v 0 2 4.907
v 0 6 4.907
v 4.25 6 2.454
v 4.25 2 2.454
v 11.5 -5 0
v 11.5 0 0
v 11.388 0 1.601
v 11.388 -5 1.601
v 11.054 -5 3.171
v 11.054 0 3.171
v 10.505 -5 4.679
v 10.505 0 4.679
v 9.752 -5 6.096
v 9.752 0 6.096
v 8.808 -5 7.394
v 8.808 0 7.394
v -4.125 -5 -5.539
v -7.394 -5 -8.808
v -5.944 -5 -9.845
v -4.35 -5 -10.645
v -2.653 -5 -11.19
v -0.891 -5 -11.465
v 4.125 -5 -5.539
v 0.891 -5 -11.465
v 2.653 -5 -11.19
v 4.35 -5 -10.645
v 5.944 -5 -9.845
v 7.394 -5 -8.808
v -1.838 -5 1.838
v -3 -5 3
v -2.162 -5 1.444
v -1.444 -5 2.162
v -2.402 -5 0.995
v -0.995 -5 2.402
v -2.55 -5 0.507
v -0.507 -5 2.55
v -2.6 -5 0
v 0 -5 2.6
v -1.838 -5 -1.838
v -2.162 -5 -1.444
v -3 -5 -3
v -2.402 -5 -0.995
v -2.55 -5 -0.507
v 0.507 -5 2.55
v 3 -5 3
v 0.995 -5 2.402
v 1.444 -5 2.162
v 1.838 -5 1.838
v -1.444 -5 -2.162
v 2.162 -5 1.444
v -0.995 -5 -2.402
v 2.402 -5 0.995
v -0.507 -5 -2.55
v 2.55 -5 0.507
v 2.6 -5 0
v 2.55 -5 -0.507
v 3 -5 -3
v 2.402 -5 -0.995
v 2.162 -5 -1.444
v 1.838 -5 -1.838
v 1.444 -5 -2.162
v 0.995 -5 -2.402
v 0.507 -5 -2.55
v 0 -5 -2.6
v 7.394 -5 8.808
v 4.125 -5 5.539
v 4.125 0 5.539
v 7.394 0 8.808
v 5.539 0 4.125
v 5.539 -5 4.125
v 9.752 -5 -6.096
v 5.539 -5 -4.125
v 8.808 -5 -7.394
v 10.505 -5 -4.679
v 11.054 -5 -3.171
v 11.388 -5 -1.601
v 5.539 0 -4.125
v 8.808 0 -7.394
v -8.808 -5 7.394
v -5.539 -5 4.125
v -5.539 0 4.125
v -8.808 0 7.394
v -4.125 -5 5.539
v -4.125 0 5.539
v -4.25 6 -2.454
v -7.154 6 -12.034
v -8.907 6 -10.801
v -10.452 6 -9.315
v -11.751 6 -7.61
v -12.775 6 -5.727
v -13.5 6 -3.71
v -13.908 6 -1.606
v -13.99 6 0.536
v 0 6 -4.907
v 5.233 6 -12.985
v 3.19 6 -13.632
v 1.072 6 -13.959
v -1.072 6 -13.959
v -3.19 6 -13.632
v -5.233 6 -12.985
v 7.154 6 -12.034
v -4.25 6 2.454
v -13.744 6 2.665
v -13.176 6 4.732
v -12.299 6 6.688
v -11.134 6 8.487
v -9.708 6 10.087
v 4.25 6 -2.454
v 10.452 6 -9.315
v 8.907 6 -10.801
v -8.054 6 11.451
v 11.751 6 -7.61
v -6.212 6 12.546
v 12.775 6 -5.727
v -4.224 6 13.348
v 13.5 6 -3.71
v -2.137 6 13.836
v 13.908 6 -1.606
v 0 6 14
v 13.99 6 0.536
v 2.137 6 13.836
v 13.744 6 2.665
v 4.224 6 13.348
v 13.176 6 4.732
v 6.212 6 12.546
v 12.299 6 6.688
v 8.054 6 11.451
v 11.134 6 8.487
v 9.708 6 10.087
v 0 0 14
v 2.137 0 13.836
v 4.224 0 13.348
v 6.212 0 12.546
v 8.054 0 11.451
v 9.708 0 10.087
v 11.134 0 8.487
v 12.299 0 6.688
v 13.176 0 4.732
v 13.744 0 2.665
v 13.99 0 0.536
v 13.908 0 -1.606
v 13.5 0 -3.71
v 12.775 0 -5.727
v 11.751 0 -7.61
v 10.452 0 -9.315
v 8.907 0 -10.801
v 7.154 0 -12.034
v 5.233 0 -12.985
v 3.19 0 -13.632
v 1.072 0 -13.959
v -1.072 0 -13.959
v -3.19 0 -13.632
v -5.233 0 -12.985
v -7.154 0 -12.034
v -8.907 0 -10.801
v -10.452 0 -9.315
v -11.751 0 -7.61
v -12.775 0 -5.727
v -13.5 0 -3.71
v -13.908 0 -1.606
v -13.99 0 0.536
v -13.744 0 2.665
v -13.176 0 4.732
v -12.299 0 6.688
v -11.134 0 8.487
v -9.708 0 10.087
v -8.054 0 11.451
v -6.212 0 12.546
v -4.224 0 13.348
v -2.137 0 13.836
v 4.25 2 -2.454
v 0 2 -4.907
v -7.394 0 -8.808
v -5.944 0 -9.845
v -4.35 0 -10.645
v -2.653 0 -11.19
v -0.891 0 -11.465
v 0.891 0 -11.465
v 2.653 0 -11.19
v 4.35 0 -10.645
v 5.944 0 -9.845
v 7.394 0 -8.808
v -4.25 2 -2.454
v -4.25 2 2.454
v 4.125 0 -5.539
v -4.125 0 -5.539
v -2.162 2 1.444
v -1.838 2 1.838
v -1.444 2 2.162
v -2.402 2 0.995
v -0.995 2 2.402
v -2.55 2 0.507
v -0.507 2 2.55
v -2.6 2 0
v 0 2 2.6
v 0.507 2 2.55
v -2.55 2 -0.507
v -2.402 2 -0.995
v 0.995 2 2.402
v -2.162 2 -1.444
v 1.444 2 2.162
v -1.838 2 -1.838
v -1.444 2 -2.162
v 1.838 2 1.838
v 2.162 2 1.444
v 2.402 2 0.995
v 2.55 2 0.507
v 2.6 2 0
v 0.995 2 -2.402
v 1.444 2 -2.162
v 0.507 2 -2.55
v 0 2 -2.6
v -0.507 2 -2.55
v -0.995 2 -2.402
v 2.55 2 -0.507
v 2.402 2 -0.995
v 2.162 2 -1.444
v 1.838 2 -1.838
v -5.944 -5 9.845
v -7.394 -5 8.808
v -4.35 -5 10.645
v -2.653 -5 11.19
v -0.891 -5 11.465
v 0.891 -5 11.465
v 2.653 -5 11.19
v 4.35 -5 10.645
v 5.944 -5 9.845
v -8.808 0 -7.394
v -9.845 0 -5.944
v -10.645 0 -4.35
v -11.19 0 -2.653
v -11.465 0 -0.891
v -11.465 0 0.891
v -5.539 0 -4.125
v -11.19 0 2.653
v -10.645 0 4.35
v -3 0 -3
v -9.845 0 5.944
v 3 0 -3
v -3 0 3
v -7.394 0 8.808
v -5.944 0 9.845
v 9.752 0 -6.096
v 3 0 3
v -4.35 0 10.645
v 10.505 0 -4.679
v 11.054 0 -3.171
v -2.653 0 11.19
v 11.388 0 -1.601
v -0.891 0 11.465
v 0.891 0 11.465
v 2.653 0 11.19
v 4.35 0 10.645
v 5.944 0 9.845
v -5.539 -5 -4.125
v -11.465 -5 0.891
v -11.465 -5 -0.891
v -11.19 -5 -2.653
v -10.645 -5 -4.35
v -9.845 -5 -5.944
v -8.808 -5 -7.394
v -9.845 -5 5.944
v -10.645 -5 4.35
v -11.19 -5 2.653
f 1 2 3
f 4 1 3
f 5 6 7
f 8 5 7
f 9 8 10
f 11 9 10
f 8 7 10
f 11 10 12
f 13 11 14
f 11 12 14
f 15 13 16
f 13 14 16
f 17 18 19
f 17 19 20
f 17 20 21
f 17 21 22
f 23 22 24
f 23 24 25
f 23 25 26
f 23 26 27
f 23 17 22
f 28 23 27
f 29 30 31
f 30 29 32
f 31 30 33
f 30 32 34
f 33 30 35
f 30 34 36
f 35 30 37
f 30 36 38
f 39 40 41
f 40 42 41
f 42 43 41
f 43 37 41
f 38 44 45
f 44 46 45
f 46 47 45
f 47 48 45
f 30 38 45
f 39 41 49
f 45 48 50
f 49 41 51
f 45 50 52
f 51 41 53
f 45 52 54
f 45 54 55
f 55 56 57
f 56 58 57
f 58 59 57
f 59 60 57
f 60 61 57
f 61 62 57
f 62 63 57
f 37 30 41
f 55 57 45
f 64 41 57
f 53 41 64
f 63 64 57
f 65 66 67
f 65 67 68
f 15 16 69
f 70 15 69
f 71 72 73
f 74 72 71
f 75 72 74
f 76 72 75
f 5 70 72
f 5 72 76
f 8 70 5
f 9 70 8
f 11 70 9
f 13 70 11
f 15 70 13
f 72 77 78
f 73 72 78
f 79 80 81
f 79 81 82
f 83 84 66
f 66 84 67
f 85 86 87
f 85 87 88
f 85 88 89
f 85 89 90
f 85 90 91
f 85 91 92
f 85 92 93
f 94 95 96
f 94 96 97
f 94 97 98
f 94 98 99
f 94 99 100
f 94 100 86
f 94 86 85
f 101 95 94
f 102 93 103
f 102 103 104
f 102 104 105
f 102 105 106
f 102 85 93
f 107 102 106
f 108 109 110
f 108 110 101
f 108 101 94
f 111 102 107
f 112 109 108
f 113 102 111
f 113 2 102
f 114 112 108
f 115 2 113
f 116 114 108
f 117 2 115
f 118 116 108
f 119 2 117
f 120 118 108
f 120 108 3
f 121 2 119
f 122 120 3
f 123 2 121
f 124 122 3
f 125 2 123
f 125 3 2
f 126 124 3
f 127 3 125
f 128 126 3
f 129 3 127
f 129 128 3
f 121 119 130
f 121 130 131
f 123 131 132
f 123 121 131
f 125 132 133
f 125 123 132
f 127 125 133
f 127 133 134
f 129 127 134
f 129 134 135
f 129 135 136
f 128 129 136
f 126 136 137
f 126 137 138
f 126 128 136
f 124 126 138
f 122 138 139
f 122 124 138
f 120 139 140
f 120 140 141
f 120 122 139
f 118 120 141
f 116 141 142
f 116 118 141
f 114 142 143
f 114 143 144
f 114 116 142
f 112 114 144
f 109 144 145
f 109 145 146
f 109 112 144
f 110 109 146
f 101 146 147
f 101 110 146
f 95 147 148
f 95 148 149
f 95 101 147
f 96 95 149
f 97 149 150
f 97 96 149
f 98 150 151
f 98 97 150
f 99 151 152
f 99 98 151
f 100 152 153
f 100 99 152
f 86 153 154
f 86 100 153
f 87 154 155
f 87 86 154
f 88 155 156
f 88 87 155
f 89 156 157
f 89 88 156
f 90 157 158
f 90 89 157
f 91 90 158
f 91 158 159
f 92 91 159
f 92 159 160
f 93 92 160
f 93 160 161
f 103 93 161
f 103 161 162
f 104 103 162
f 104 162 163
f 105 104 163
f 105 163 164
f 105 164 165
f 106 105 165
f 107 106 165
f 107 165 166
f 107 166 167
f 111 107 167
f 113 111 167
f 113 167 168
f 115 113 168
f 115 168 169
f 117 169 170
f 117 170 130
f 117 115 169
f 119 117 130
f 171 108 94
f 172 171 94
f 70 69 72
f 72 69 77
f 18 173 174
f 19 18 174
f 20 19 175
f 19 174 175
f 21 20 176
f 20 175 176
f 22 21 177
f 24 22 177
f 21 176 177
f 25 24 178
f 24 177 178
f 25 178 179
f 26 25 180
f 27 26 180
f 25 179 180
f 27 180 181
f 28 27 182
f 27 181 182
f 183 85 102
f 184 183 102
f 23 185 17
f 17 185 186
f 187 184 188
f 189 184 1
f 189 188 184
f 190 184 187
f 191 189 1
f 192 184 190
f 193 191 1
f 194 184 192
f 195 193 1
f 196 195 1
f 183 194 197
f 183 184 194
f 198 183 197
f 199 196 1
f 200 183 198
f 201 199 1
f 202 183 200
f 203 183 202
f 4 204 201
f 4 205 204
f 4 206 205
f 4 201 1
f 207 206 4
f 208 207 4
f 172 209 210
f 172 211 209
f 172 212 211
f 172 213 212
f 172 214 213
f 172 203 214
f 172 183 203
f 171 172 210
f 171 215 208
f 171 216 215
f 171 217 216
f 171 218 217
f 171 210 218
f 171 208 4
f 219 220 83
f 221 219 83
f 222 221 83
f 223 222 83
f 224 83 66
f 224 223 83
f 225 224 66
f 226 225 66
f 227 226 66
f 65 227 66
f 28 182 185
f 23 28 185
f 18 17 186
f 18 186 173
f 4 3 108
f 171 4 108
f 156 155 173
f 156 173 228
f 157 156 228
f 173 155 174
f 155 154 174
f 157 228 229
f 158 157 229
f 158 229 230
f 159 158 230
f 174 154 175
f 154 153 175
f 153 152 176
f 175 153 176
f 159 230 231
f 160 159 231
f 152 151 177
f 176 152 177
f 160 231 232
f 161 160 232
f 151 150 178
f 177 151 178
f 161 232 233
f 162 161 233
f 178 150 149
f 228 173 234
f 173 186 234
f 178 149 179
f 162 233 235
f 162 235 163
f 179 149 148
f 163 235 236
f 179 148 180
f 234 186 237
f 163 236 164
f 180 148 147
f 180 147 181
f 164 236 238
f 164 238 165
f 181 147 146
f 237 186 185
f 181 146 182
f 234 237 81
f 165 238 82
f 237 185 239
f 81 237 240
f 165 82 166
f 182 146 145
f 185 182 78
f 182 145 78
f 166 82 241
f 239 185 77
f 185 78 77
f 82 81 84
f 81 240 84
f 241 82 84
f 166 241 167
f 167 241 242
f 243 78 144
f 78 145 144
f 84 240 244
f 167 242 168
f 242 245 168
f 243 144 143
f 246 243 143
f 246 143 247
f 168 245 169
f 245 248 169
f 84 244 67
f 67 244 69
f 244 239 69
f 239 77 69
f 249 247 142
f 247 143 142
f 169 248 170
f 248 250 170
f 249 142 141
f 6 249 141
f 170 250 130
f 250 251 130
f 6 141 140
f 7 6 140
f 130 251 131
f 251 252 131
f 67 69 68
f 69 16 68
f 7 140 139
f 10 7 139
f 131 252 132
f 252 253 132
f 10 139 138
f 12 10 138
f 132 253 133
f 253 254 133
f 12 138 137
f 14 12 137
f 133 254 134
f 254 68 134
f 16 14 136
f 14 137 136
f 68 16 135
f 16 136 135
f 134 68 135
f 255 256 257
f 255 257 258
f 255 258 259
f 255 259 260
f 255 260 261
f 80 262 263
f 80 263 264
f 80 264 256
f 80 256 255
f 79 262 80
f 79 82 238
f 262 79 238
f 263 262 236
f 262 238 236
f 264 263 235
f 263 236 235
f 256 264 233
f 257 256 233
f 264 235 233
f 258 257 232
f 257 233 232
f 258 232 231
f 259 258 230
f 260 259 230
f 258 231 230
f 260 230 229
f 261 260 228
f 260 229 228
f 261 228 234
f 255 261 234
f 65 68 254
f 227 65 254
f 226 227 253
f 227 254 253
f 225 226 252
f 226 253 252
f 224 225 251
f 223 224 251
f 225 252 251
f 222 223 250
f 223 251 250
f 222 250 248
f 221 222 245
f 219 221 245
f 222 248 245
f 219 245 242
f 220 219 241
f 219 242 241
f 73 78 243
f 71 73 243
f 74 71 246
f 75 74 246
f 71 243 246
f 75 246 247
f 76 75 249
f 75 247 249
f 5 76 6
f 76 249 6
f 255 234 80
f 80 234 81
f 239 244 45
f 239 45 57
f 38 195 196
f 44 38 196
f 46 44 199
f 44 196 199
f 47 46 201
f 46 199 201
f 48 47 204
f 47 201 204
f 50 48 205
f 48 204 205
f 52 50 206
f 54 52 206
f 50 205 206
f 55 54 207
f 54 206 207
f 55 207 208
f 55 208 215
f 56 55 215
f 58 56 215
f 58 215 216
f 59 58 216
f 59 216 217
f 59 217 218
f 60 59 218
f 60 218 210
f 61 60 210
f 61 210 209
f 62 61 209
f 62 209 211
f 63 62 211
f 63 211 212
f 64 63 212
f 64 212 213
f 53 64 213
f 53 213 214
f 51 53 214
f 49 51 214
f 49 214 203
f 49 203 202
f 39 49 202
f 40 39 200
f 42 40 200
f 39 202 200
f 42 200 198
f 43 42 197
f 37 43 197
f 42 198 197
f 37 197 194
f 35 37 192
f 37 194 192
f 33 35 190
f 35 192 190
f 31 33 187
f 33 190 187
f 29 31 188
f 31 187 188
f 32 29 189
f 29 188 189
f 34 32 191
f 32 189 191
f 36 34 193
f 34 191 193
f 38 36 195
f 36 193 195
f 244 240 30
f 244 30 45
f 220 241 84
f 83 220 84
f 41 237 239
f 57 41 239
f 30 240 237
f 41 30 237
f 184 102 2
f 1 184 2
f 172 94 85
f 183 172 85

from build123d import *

# Parameters (mm, degrees)
SKETCH3_W           = 6
SKETCH3_H           = 6
SKETCH3_R           = 2.6
BASE_DEPTH          = 5
BLOC_START          = 6
SKETCH8_R           = 14
SKETCH8_R_2         = 2.6
BLOC_DEPTH          = 6
NUT_PLACE_DEPTH     = 4
REINFORCEMENT_DEPTH = 5


with BuildPart() as part:
    # Sketch3 → Base (new body)
    with BuildSketch(Plane(origin=(0, 0, 0), x_dir=(1, 0, 0), z_dir=(0, 1, 0))):
        Rectangle(SKETCH3_W, SKETCH3_H)
        with Locations(Location((0, 0, 0), (0, 0, 270))):
            Circle(SKETCH3_R, mode=Mode.SUBTRACT)
    extrude(amount=-BASE_DEPTH)

    # Sketch8 → Bloc (add)
    with BuildSketch(Plane(origin=(0, 0, 0), x_dir=(1, 0, 0), z_dir=(0, 1, 0)).offset(BLOC_START)):
        with Locations(Location((0, 0, 0), (0, 0, 270))):
            Circle(SKETCH8_R)
        with Locations(Location((0, 0, 0), (0, 0, 270))):
            Circle(SKETCH8_R_2, mode=Mode.SUBTRACT)
    extrude(amount=-BLOC_DEPTH)

    # Sketch4 → Nut_place (cut)
    with BuildSketch(Plane(origin=(0, 6, 0), x_dir=(1, 0, 0), z_dir=(0, 1, 0))):
        Polygon((0, 4.907477288), (-4.25, 2.453738644), (-4.25, -2.453738644), (0, -4.907477288), (4.25, -2.453738644), (4.25, 2.453738644), align=None)
    extrude(amount=-NUT_PLACE_DEPTH, mode=Mode.SUBTRACT)

    # Sketch9 → Reinforcement (add)
    with BuildSketch(Plane.XZ):
        with BuildLine():
            ThreePointArc((11.5, 0), (10.806071801, 3.934312168), (8.808032654, 7.393819092))
            Line((8.808032654, 7.393819092), (5.539213562, 4.125))
            Line((5.539213562, 4.125), (5.539213562, -4.125))
            Line((5.539213562, -4.125), (8.808032654, -7.393819092))
            ThreePointArc((8.808032654, -7.393819092), (10.806071801, -3.934312168), (11.5, 0))
        make_face()
        with BuildLine():
            Line((-4.125, -5.539213562), (-7.393819092, -8.808032654))
            ThreePointArc((-7.393819092, -8.808032654), (0, -11.5), (7.393819092, -8.808032654))
            Line((7.393819092, -8.808032654), (4.125, -5.539213562))
            Line((4.125, -5.539213562), (-4.125, -5.539213562))
        make_face()
        with BuildLine():
            Line((-5.539213562, -4.125), (-5.539213562, 4.125))
            Line((-5.539213562, 4.125), (-8.808032654, 7.393819092))
            ThreePointArc((-8.808032654, 7.393819092), (-11.5, 0), (-8.808032654, -7.393819092))
            Line((-8.808032654, -7.393819092), (-5.539213562, -4.125))
        make_face()
        with BuildLine():
            ThreePointArc((7.393819092, 8.808032654), (0, 11.5), (-7.393819092, 8.808032654))
            Line((-7.393819092, 8.808032654), (-4.125, 5.539213562))
            Line((-4.125, 5.539213562), (4.125, 5.539213562))
            Line((4.125, 5.539213562), (7.393819092, 8.808032654))
        make_face()
    extrude(amount=REINFORCEMENT_DEPTH)


solid = part.part
